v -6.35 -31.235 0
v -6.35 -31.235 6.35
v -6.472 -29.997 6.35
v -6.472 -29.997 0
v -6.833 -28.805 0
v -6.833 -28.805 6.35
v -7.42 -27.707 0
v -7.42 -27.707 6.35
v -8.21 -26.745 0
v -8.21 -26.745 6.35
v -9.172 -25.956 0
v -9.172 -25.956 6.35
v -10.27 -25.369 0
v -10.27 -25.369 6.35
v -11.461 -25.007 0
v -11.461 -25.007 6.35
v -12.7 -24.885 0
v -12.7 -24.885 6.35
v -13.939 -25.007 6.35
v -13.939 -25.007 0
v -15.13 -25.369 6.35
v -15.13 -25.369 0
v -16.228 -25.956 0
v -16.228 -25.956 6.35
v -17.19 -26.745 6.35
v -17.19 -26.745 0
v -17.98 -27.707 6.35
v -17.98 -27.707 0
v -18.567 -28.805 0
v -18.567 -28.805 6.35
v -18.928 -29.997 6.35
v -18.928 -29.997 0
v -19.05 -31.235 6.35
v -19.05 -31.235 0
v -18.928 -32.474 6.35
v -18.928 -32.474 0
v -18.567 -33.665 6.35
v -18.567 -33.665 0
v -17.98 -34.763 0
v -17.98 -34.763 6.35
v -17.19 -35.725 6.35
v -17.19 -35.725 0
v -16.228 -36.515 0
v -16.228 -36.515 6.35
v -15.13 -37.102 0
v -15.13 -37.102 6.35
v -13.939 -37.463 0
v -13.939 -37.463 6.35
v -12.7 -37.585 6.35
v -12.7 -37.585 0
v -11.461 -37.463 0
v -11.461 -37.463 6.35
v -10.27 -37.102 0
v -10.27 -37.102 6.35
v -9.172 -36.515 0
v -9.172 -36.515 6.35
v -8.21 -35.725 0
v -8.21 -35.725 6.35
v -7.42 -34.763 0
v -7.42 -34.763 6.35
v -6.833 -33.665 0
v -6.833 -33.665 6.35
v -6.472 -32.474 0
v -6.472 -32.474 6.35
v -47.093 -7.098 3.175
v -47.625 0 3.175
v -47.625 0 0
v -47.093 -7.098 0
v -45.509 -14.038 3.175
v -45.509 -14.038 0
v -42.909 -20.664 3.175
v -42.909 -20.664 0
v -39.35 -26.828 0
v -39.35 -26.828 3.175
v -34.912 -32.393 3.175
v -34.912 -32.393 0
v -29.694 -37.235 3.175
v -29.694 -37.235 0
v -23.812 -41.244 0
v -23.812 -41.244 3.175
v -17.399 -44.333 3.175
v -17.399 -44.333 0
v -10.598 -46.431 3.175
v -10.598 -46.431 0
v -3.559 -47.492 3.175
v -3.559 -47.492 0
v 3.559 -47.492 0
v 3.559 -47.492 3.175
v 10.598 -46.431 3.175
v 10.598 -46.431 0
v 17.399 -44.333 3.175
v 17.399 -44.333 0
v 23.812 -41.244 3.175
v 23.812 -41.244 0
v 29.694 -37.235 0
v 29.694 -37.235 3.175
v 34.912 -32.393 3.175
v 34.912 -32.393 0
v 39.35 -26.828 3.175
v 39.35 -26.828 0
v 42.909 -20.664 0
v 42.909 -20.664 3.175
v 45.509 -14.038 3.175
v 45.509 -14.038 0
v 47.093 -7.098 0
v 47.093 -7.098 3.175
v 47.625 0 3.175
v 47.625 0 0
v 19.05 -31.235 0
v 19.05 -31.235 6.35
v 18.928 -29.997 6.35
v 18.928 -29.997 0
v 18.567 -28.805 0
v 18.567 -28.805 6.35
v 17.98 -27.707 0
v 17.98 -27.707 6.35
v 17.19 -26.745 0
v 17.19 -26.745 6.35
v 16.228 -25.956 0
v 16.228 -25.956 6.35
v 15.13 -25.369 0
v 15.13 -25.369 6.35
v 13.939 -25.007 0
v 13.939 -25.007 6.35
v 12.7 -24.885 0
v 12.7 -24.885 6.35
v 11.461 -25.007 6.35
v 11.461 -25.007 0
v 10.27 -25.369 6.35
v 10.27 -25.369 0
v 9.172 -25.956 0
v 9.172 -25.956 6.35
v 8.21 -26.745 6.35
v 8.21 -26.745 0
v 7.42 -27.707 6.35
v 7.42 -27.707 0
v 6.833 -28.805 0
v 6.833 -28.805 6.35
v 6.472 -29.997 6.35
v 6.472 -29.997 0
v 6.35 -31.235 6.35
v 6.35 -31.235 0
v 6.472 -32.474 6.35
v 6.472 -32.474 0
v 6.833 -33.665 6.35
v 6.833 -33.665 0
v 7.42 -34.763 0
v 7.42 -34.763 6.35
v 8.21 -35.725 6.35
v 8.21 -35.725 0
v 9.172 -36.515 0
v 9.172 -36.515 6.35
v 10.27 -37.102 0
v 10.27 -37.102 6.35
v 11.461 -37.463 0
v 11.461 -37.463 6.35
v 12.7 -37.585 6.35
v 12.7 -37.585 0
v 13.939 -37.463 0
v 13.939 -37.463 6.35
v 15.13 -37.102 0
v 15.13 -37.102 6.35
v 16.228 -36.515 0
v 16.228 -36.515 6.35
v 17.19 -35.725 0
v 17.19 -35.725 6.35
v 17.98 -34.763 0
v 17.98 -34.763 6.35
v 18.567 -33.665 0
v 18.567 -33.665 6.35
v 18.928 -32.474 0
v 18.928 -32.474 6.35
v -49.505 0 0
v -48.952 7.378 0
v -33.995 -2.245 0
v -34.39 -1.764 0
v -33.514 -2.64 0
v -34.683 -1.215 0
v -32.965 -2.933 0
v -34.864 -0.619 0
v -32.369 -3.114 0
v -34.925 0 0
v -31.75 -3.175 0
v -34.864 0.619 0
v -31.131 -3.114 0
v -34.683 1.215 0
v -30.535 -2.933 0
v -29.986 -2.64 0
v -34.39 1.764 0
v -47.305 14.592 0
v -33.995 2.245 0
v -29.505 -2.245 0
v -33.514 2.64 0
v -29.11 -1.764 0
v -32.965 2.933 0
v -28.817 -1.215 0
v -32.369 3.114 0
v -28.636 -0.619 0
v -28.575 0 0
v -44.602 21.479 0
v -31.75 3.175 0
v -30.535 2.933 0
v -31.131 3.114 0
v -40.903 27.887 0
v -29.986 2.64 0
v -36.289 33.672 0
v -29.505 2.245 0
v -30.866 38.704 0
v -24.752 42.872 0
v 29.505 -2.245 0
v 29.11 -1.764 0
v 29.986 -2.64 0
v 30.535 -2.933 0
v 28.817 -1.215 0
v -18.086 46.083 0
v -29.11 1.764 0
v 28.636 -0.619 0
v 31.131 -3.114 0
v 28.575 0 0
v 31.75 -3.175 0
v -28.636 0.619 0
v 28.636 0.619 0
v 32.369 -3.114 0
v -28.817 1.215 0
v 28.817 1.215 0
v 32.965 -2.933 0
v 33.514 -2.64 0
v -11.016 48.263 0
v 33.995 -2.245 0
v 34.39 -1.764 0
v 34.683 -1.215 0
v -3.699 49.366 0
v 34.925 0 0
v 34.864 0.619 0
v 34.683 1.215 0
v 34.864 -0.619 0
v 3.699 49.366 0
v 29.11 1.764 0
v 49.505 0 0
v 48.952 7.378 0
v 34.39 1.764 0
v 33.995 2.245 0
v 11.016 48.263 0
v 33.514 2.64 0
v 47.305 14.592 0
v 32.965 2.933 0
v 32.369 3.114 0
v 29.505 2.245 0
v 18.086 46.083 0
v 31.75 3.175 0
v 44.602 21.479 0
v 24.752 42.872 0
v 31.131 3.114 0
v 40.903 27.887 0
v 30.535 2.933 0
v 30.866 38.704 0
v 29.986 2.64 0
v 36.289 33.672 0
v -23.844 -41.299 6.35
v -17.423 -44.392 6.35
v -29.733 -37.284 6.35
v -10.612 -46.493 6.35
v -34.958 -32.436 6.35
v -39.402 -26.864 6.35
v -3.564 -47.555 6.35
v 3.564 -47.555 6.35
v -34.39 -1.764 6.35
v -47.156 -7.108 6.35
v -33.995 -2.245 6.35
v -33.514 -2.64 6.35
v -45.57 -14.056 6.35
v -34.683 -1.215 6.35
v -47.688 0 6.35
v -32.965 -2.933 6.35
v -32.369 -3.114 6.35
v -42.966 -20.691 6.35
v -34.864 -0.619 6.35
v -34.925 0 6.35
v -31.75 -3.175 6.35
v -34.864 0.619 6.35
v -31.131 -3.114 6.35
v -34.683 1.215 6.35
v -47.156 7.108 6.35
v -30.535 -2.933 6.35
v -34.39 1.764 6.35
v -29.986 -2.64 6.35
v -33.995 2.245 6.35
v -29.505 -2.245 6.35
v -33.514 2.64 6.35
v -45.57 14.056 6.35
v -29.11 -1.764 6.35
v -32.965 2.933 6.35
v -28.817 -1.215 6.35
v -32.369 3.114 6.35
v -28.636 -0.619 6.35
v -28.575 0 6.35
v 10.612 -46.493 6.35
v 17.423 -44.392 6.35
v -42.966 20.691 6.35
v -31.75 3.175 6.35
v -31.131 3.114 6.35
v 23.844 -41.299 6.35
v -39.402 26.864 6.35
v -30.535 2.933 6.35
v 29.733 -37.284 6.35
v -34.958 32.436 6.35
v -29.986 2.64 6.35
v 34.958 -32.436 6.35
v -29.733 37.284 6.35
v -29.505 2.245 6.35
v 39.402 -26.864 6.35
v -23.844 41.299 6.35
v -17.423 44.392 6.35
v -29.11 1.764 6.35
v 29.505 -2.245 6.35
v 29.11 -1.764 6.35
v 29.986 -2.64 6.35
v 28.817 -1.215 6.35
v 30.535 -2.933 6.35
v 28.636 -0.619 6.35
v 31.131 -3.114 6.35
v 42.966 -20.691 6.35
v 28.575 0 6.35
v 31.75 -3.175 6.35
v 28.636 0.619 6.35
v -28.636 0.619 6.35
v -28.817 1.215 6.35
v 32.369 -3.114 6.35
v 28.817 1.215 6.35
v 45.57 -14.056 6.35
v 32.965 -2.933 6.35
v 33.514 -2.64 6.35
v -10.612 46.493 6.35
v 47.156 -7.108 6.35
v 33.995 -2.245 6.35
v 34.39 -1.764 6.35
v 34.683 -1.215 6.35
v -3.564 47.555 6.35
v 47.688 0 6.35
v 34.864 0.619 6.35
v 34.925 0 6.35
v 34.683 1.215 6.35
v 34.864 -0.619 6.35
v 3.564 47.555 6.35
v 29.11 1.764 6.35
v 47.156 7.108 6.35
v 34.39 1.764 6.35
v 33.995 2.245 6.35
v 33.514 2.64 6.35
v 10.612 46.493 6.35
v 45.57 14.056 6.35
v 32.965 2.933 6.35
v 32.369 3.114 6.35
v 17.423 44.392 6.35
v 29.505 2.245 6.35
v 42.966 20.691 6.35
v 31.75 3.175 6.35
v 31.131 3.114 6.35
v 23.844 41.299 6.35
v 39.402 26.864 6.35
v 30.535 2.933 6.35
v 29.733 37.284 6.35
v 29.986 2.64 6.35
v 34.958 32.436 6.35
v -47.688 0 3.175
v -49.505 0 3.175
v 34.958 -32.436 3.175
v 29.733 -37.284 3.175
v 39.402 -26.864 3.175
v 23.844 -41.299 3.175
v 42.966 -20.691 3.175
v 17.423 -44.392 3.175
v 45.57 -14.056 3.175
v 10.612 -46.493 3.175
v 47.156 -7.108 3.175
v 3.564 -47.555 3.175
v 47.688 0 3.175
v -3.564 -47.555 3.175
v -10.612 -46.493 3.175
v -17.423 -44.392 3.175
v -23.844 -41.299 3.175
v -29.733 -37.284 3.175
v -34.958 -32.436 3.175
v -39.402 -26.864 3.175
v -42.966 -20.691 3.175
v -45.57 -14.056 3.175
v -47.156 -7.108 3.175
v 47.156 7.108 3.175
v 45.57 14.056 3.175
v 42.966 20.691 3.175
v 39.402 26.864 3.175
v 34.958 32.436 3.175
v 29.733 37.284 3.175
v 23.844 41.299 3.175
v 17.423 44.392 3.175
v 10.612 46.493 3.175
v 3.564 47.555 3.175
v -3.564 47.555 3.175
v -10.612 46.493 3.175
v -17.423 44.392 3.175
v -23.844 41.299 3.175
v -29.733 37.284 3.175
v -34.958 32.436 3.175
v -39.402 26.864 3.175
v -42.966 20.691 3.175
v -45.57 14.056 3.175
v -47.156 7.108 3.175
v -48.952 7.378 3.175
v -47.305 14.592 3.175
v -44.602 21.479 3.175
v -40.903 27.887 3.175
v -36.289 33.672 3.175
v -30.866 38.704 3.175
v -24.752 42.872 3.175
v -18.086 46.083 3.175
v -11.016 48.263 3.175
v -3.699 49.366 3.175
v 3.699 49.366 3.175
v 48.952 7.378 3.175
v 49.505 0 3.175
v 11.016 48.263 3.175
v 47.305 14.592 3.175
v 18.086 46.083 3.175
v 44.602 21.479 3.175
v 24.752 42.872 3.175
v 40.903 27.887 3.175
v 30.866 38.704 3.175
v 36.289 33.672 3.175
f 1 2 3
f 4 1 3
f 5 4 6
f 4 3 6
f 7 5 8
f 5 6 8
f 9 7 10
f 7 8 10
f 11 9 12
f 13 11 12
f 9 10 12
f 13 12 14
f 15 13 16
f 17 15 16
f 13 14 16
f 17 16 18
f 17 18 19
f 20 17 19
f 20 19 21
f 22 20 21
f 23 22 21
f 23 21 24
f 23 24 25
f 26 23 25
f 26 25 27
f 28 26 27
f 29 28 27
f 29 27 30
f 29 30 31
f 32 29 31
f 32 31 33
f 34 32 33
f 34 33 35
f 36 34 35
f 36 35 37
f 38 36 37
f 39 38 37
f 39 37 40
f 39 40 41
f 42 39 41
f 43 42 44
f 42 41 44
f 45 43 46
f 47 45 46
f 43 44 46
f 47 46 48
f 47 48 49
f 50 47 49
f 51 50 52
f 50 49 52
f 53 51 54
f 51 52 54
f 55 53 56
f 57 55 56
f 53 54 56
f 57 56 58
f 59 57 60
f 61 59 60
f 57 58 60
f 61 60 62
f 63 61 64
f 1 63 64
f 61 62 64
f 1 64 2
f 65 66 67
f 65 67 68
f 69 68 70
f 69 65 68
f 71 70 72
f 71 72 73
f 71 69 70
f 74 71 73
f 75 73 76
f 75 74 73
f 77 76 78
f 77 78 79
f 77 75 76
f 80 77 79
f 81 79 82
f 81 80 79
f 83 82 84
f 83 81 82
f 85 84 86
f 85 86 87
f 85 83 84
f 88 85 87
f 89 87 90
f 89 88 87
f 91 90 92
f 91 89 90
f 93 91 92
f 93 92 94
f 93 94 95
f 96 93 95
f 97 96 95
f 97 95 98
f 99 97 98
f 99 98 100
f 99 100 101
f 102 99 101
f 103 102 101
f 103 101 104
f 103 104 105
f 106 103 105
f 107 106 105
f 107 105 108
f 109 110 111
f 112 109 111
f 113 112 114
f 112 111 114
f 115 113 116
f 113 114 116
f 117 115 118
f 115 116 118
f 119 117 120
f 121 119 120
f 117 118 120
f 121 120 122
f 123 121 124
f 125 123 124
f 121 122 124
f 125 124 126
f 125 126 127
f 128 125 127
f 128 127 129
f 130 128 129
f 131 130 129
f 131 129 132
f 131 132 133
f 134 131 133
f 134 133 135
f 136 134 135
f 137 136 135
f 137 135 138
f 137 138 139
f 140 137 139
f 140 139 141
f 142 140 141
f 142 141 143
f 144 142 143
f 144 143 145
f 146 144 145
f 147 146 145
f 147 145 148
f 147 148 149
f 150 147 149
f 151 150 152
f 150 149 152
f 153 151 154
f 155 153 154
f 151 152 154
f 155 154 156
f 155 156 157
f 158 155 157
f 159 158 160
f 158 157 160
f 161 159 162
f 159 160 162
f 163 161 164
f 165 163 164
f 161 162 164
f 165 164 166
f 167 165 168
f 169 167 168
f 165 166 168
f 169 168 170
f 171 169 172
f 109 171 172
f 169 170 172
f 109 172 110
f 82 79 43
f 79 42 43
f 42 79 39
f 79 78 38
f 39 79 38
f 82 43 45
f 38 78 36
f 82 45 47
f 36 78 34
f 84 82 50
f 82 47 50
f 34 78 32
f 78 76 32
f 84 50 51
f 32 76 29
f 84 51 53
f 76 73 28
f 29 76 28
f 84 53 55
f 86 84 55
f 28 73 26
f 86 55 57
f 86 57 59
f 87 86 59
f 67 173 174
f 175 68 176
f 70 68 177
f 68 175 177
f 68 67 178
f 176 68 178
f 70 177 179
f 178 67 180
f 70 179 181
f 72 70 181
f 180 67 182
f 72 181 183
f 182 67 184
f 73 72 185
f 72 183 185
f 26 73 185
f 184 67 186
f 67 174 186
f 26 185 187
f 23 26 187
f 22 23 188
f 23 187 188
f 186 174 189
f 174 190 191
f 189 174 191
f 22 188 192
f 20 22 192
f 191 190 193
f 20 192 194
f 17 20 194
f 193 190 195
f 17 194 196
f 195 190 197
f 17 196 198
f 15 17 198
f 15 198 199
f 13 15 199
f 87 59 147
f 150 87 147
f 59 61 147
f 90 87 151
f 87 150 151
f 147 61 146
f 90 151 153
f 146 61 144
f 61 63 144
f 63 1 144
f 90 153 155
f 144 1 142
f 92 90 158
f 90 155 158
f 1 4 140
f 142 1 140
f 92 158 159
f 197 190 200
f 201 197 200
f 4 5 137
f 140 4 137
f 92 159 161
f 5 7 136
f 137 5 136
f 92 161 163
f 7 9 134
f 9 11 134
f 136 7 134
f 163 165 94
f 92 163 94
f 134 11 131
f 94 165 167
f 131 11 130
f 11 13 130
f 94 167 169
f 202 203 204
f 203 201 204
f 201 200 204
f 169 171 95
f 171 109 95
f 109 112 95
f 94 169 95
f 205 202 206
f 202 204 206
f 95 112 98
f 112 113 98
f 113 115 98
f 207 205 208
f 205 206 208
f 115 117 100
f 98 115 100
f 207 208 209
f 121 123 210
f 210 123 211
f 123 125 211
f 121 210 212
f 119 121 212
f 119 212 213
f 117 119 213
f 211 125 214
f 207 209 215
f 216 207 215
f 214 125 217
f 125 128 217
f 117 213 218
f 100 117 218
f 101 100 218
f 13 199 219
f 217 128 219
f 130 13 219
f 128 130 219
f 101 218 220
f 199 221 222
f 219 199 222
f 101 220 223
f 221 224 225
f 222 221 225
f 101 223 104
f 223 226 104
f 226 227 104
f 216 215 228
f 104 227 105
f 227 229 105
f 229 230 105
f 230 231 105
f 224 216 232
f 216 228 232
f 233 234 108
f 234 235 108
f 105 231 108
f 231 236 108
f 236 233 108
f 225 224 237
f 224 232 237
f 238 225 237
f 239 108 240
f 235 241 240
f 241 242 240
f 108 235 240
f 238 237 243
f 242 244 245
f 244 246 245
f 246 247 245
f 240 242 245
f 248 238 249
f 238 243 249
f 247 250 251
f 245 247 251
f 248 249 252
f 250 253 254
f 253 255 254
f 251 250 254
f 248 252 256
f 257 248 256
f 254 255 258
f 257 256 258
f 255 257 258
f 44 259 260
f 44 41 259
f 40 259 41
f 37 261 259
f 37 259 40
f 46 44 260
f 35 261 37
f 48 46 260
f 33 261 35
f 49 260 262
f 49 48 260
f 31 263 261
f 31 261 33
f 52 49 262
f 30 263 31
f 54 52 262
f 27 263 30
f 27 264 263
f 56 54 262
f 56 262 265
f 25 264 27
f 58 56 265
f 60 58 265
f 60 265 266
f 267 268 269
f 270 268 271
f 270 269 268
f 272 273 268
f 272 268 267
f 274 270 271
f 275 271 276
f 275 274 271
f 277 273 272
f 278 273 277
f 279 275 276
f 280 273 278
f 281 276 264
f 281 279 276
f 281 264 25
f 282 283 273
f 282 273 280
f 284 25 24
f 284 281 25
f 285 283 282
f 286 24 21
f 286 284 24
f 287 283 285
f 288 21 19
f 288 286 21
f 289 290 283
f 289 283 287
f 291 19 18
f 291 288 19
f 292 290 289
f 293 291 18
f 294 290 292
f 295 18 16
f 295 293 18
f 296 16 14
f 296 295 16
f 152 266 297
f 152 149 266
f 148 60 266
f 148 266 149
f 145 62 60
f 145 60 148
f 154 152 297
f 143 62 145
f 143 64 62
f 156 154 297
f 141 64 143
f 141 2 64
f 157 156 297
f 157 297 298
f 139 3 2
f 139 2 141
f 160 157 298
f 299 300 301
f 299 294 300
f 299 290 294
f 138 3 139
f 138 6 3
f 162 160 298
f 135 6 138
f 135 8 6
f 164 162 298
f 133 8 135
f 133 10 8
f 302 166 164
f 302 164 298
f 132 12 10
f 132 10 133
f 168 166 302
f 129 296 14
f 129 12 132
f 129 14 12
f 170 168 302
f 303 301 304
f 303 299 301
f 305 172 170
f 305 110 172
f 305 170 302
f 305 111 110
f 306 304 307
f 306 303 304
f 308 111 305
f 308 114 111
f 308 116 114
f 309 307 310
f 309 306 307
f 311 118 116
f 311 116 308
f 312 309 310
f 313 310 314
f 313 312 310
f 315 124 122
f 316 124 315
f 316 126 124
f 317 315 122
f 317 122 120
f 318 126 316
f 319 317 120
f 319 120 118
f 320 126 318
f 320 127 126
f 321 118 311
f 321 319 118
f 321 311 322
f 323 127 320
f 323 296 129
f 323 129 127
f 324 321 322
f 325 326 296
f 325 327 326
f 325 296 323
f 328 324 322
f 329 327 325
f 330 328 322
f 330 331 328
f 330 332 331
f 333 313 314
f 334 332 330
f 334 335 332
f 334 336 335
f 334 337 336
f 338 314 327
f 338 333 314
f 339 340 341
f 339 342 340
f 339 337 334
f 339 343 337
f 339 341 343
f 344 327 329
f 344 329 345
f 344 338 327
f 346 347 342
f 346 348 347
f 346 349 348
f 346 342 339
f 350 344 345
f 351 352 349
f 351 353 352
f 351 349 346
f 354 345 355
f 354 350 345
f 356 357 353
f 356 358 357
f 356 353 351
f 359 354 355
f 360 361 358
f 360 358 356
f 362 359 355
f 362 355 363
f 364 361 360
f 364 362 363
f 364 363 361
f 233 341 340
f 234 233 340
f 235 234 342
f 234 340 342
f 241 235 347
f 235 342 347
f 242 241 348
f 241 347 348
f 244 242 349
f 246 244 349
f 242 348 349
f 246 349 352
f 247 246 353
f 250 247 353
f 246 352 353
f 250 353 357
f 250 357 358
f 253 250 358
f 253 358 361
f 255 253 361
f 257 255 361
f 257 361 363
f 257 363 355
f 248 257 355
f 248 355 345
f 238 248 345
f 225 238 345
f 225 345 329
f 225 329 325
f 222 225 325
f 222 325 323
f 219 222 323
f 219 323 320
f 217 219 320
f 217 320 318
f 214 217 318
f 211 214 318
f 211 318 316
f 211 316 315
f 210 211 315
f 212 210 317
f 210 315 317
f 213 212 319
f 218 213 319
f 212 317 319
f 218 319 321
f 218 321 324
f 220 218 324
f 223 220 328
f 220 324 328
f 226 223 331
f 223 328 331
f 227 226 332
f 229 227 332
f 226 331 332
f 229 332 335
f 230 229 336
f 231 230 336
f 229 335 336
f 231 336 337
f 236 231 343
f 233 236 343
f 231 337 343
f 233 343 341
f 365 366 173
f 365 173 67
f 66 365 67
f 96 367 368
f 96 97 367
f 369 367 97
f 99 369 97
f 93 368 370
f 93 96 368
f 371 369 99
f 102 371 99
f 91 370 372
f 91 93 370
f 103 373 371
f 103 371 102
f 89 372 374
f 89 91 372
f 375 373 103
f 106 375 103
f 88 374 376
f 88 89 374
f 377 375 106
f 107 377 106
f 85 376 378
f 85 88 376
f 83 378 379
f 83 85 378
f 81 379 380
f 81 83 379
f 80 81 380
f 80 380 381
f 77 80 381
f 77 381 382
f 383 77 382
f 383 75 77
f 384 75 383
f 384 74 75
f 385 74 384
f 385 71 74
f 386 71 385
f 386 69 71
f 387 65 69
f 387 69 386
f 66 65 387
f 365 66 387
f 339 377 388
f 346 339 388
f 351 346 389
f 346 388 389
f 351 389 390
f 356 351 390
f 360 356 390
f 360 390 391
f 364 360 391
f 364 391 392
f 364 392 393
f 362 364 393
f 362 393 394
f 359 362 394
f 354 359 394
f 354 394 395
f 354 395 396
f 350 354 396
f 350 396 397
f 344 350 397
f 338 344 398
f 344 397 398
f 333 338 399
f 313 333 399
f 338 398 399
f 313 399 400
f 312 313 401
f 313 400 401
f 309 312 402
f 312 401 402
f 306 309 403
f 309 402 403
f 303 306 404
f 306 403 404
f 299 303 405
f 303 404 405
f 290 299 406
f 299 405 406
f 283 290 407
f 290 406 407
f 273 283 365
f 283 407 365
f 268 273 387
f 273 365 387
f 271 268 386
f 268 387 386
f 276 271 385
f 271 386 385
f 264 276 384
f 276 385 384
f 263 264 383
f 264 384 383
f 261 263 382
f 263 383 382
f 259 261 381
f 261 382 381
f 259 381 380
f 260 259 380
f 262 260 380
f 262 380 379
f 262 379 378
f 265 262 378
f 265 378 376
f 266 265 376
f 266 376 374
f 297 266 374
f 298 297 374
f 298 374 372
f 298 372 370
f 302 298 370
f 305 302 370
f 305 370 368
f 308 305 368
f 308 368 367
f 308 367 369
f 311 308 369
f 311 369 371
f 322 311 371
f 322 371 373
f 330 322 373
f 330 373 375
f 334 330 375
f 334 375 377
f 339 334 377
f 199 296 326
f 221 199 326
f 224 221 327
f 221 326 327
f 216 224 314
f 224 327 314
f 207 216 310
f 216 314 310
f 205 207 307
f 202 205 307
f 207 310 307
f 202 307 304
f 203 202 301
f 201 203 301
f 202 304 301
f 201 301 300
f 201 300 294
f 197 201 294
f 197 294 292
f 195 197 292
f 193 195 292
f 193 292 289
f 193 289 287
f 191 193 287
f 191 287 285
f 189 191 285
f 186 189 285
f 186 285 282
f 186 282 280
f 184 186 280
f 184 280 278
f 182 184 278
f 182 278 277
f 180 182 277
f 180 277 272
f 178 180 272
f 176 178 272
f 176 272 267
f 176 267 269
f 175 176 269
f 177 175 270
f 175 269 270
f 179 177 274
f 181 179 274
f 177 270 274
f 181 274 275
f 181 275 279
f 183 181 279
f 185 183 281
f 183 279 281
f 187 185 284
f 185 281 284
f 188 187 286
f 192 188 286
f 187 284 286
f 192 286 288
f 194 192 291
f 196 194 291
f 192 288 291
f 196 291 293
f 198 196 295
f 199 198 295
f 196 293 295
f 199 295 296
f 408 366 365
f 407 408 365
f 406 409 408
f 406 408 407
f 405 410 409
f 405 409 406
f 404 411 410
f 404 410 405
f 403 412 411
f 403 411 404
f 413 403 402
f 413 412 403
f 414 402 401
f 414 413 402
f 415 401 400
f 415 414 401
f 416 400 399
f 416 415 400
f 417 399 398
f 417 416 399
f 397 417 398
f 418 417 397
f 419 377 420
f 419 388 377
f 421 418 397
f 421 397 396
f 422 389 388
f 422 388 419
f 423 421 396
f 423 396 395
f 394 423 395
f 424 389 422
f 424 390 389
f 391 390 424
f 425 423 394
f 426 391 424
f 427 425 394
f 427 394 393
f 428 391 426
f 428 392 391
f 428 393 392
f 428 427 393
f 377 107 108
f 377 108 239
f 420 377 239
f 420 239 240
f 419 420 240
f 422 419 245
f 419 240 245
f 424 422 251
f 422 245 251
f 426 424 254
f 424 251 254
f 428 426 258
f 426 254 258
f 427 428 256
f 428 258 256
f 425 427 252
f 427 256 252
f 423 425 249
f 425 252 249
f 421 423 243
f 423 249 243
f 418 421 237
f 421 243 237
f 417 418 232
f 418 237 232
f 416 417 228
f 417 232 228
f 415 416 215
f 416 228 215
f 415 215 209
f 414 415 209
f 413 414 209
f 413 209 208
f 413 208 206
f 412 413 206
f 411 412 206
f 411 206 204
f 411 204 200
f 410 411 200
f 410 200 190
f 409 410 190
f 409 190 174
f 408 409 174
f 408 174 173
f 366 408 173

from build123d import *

# Parameters (mm, degrees)
SKETCH1_R           = 49.5046
BOSS_EXTRUDE1_DEPTH = 3.175
SKETCH2_R           = 47.6885
BOSS_EXTRUDE2_DEPTH = 3.175
SKETCH3_R           = 3.175
SKETCH3_R_2         = 6.35
CUT_EXTRUDE1_DEPTH  = 7.35
CUT_EXTRUDE2_DEPTH  = 4.175


with BuildPart() as part:
    # Sketch1 → Boss-Extrude1 (new body)
    with BuildSketch(Plane.XY):
        Circle(SKETCH1_R)
    extrude(amount=BOSS_EXTRUDE1_DEPTH)

    # Sketch2 → Boss-Extrude2 (add)
    with BuildSketch(Plane.XY.offset(3.175)):
        Circle(SKETCH2_R)
    extrude(amount=BOSS_EXTRUDE2_DEPTH)

    # Sketch3 → Cut-Extrude1 (cut, through all)
    with BuildSketch(Plane.XY.offset(6.35)):
        with Locations((-31.75, 0)):
            Circle(SKETCH3_R)
        with Locations((31.75, 0)):
            Circle(SKETCH3_R)
        with Locations((-12.7, -31.235352443)):
            Circle(SKETCH3_R_2)
        with Locations((12.7, -31.235352443)):
            Circle(SKETCH3_R_2)
    extrude(amount=-CUT_EXTRUDE1_DEPTH, mode=Mode.SUBTRACT)

    # Sketch4 → Cut-Extrude2 (cut, through all)
    with BuildSketch(Plane.XY.offset(3.175)):
        with BuildLine():
            Line((-50.165, 0), (-47.625, 0))
            ThreePointArc((-47.625, 0), (0, -47.625), (47.625, 0))
            Line((47.625, 0), (50.165, 0))
            ThreePointArc((50.165, 0), (0, -50.165), (-50.165, 0))
        make_face()
    extrude(amount=-CUT_EXTRUDE2_DEPTH, mode=Mode.SUBTRACT)


solid = part.part
